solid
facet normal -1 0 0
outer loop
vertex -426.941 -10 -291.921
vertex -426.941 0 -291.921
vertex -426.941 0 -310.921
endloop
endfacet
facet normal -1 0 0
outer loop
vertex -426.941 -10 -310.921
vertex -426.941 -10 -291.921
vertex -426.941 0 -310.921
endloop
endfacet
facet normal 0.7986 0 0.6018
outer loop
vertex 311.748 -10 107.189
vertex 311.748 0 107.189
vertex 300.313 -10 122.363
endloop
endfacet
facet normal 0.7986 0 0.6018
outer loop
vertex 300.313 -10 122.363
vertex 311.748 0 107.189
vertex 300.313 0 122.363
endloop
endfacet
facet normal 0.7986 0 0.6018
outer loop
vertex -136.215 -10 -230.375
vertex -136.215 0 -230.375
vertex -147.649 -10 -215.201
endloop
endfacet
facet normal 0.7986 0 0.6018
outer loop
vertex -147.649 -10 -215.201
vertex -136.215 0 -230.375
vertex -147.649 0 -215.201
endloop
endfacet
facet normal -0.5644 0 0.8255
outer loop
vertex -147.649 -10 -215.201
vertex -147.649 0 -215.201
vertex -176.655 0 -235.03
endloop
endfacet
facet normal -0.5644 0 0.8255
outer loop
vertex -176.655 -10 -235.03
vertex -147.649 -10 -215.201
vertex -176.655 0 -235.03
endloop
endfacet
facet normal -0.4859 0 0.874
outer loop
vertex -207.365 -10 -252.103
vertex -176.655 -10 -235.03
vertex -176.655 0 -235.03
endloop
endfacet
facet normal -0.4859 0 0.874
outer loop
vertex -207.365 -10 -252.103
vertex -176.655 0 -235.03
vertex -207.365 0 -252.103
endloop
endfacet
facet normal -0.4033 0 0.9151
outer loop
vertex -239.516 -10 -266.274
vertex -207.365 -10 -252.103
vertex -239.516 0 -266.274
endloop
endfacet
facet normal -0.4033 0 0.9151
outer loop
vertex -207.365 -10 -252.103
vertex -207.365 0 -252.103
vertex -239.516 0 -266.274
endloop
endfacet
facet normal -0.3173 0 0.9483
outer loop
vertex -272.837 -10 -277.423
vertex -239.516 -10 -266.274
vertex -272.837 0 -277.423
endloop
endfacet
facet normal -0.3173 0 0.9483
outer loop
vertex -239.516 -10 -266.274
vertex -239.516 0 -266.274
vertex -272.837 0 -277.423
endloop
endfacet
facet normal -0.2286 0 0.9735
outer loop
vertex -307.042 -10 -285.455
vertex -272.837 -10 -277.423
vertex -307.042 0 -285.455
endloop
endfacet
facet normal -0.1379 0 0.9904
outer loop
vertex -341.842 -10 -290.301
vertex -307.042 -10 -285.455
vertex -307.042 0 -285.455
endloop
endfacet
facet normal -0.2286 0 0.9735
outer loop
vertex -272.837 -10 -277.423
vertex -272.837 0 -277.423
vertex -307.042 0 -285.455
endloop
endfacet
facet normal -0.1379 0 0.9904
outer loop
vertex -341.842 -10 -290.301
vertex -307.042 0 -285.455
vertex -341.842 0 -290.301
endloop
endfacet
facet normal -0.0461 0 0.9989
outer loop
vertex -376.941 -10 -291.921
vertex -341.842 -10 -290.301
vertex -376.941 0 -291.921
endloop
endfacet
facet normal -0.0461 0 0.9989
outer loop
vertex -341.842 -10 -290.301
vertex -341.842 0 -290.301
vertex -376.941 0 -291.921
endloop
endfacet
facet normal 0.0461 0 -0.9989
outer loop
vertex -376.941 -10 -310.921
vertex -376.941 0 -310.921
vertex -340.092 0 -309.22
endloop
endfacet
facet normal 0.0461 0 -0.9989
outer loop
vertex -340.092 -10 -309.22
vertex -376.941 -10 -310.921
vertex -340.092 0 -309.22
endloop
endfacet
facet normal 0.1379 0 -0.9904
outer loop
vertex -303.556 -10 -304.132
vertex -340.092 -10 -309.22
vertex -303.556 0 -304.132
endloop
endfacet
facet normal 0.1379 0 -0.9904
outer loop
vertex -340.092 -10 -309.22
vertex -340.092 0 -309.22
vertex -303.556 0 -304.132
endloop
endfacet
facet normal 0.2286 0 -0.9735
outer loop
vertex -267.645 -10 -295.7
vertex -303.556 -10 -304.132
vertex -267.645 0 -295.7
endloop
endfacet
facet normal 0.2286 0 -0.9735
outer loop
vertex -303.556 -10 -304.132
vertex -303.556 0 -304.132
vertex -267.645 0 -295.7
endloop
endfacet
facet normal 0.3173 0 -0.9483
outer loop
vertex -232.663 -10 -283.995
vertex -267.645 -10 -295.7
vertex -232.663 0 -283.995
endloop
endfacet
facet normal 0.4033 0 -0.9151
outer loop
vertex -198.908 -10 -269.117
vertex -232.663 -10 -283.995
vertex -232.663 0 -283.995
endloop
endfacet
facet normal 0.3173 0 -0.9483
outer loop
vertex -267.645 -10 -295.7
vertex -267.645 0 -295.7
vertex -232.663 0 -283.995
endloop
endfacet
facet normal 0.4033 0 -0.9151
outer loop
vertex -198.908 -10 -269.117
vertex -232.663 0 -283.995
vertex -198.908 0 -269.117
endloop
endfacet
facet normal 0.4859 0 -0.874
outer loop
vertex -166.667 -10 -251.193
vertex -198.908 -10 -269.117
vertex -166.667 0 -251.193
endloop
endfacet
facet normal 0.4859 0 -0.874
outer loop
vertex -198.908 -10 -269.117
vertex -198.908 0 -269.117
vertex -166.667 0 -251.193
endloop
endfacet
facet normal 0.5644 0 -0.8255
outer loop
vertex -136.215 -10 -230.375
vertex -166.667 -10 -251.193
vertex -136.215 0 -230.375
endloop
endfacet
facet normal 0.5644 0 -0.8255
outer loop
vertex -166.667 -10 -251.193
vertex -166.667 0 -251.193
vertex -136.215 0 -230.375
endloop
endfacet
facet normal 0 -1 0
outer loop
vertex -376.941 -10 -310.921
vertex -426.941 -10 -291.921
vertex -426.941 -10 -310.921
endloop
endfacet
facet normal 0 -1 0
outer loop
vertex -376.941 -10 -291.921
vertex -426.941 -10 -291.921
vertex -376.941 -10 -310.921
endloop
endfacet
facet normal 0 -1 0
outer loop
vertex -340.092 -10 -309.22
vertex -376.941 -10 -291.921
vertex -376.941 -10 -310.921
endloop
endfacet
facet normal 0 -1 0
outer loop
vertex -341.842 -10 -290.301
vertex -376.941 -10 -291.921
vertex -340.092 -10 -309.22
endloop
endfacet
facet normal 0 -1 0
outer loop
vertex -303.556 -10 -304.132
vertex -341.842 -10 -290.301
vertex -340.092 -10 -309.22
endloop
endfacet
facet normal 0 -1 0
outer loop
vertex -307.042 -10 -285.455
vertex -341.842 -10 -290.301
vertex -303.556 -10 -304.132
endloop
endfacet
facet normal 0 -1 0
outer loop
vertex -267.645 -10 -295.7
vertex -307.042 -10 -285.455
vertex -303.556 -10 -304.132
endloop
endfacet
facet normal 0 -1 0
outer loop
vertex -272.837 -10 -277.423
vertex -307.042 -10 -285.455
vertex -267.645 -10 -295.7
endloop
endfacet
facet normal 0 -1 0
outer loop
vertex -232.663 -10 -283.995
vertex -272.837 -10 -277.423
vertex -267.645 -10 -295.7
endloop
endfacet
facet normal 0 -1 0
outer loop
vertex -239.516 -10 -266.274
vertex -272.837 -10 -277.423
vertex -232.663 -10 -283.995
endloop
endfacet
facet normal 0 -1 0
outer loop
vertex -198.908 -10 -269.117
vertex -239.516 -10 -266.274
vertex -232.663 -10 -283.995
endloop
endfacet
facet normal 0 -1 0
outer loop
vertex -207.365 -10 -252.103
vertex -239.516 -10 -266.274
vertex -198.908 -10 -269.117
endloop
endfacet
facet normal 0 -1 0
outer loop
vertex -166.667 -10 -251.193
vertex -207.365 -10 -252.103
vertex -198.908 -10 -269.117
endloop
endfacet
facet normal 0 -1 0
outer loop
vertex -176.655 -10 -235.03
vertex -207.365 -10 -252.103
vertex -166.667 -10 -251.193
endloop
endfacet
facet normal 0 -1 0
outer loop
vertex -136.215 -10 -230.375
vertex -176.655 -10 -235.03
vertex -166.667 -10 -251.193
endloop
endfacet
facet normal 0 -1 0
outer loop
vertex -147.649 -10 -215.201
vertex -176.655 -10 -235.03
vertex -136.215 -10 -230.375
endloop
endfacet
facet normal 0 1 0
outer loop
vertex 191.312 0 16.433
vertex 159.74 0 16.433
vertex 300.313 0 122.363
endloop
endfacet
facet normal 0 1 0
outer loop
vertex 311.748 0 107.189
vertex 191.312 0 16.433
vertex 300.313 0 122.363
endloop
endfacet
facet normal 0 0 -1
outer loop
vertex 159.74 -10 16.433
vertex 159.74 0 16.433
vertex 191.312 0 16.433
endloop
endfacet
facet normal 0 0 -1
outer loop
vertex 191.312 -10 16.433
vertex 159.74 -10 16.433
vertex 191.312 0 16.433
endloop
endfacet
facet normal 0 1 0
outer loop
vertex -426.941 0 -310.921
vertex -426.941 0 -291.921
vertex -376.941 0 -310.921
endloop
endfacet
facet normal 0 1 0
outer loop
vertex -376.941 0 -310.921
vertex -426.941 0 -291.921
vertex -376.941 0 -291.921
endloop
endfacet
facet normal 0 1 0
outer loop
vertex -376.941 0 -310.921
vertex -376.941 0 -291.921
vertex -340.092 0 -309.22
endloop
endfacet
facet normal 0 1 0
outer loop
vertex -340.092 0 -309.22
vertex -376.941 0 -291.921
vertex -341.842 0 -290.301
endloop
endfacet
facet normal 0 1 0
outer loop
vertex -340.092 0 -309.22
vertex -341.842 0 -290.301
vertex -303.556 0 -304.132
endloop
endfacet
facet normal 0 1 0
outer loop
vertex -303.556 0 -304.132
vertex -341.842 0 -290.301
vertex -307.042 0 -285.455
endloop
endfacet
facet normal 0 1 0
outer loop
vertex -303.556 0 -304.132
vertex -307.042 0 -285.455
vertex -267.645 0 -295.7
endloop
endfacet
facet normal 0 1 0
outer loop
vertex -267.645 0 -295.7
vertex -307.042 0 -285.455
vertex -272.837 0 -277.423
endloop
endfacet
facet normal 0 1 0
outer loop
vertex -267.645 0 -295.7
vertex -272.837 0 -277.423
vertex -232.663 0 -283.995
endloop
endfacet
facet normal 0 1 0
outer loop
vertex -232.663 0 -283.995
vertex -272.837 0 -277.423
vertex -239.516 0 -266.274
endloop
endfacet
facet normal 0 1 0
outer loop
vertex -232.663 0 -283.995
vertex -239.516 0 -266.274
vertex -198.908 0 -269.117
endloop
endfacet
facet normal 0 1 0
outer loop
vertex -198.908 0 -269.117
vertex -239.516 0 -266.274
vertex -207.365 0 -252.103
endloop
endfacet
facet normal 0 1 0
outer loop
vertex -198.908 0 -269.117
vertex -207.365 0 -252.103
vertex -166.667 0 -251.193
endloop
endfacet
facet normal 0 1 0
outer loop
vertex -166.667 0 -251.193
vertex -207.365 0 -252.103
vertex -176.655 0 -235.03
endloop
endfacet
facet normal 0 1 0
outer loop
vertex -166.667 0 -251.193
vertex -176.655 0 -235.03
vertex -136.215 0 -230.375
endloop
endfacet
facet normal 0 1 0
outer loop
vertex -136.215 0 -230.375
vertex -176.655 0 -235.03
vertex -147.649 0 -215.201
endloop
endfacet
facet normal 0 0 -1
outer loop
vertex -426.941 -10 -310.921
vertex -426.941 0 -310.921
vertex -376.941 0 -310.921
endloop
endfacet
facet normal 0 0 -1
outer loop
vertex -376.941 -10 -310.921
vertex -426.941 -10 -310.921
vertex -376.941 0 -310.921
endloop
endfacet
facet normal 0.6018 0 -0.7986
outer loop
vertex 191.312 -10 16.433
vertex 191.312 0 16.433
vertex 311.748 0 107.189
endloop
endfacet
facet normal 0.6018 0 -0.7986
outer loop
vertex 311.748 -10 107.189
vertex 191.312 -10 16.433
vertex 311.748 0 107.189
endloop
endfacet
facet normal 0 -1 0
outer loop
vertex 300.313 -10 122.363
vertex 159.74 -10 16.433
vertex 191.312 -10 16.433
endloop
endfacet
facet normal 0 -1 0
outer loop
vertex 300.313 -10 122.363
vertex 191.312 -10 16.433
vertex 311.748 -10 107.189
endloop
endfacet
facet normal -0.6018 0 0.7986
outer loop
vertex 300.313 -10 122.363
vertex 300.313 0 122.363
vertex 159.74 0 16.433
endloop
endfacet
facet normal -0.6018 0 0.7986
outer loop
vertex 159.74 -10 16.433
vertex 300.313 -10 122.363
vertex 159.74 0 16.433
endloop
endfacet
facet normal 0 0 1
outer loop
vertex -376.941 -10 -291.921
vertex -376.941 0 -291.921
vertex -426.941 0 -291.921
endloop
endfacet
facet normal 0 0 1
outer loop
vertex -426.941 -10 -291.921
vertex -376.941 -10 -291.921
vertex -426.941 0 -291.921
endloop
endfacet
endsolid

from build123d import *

# Parameters (mm, degrees)
F1_DEPTH = 10


# Not quite as in the source:
# - a feature names something its author has since deleted; it is built from what else it names


with BuildPart() as f1:
    # F0 (on Front) → F1 (new body)
    with BuildSketch(Plane.XZ):
        with BuildLine():
            Line((-136.214891398, -230.3754368354), (-147.6493768378, -215.2013621445))
            ThreePointArc((-147.6493768378, -215.2013621445), (-256.0478265684, -272.23254545), (-376.9409006588, -291.9212328165))
            Line((-376.9409006588, -291.9212328165), (-426.9409006588, -291.9212328165))
            Line((-426.9409006588, -291.9212328165), (-426.9409006588, -310.9212328165))
            Line((-426.9409006588, -310.9212328165), (-376.9409006588, -310.9212328165))
            ThreePointArc((-376.9409006588, -310.9212328165), (-250.0190380967, -290.250694899), (-136.214891398, -230.3754368354))
        make_face()
    extrude(amount=F1_DEPTH)


with BuildPart() as f1b:
    # F0 (on Front) → F1, piece 2 (new body)
    with BuildSketch(Plane.XZ):
        Polygon((311.7478876598, 107.1887296189), (300.3134022199, 122.3628043098), (159.7403426108, 16.433405906), (191.3115052921, 16.433405906), align=None)
    extrude(amount=F1_DEPTH)


solid = Compound([f1.part, f1b.part])
